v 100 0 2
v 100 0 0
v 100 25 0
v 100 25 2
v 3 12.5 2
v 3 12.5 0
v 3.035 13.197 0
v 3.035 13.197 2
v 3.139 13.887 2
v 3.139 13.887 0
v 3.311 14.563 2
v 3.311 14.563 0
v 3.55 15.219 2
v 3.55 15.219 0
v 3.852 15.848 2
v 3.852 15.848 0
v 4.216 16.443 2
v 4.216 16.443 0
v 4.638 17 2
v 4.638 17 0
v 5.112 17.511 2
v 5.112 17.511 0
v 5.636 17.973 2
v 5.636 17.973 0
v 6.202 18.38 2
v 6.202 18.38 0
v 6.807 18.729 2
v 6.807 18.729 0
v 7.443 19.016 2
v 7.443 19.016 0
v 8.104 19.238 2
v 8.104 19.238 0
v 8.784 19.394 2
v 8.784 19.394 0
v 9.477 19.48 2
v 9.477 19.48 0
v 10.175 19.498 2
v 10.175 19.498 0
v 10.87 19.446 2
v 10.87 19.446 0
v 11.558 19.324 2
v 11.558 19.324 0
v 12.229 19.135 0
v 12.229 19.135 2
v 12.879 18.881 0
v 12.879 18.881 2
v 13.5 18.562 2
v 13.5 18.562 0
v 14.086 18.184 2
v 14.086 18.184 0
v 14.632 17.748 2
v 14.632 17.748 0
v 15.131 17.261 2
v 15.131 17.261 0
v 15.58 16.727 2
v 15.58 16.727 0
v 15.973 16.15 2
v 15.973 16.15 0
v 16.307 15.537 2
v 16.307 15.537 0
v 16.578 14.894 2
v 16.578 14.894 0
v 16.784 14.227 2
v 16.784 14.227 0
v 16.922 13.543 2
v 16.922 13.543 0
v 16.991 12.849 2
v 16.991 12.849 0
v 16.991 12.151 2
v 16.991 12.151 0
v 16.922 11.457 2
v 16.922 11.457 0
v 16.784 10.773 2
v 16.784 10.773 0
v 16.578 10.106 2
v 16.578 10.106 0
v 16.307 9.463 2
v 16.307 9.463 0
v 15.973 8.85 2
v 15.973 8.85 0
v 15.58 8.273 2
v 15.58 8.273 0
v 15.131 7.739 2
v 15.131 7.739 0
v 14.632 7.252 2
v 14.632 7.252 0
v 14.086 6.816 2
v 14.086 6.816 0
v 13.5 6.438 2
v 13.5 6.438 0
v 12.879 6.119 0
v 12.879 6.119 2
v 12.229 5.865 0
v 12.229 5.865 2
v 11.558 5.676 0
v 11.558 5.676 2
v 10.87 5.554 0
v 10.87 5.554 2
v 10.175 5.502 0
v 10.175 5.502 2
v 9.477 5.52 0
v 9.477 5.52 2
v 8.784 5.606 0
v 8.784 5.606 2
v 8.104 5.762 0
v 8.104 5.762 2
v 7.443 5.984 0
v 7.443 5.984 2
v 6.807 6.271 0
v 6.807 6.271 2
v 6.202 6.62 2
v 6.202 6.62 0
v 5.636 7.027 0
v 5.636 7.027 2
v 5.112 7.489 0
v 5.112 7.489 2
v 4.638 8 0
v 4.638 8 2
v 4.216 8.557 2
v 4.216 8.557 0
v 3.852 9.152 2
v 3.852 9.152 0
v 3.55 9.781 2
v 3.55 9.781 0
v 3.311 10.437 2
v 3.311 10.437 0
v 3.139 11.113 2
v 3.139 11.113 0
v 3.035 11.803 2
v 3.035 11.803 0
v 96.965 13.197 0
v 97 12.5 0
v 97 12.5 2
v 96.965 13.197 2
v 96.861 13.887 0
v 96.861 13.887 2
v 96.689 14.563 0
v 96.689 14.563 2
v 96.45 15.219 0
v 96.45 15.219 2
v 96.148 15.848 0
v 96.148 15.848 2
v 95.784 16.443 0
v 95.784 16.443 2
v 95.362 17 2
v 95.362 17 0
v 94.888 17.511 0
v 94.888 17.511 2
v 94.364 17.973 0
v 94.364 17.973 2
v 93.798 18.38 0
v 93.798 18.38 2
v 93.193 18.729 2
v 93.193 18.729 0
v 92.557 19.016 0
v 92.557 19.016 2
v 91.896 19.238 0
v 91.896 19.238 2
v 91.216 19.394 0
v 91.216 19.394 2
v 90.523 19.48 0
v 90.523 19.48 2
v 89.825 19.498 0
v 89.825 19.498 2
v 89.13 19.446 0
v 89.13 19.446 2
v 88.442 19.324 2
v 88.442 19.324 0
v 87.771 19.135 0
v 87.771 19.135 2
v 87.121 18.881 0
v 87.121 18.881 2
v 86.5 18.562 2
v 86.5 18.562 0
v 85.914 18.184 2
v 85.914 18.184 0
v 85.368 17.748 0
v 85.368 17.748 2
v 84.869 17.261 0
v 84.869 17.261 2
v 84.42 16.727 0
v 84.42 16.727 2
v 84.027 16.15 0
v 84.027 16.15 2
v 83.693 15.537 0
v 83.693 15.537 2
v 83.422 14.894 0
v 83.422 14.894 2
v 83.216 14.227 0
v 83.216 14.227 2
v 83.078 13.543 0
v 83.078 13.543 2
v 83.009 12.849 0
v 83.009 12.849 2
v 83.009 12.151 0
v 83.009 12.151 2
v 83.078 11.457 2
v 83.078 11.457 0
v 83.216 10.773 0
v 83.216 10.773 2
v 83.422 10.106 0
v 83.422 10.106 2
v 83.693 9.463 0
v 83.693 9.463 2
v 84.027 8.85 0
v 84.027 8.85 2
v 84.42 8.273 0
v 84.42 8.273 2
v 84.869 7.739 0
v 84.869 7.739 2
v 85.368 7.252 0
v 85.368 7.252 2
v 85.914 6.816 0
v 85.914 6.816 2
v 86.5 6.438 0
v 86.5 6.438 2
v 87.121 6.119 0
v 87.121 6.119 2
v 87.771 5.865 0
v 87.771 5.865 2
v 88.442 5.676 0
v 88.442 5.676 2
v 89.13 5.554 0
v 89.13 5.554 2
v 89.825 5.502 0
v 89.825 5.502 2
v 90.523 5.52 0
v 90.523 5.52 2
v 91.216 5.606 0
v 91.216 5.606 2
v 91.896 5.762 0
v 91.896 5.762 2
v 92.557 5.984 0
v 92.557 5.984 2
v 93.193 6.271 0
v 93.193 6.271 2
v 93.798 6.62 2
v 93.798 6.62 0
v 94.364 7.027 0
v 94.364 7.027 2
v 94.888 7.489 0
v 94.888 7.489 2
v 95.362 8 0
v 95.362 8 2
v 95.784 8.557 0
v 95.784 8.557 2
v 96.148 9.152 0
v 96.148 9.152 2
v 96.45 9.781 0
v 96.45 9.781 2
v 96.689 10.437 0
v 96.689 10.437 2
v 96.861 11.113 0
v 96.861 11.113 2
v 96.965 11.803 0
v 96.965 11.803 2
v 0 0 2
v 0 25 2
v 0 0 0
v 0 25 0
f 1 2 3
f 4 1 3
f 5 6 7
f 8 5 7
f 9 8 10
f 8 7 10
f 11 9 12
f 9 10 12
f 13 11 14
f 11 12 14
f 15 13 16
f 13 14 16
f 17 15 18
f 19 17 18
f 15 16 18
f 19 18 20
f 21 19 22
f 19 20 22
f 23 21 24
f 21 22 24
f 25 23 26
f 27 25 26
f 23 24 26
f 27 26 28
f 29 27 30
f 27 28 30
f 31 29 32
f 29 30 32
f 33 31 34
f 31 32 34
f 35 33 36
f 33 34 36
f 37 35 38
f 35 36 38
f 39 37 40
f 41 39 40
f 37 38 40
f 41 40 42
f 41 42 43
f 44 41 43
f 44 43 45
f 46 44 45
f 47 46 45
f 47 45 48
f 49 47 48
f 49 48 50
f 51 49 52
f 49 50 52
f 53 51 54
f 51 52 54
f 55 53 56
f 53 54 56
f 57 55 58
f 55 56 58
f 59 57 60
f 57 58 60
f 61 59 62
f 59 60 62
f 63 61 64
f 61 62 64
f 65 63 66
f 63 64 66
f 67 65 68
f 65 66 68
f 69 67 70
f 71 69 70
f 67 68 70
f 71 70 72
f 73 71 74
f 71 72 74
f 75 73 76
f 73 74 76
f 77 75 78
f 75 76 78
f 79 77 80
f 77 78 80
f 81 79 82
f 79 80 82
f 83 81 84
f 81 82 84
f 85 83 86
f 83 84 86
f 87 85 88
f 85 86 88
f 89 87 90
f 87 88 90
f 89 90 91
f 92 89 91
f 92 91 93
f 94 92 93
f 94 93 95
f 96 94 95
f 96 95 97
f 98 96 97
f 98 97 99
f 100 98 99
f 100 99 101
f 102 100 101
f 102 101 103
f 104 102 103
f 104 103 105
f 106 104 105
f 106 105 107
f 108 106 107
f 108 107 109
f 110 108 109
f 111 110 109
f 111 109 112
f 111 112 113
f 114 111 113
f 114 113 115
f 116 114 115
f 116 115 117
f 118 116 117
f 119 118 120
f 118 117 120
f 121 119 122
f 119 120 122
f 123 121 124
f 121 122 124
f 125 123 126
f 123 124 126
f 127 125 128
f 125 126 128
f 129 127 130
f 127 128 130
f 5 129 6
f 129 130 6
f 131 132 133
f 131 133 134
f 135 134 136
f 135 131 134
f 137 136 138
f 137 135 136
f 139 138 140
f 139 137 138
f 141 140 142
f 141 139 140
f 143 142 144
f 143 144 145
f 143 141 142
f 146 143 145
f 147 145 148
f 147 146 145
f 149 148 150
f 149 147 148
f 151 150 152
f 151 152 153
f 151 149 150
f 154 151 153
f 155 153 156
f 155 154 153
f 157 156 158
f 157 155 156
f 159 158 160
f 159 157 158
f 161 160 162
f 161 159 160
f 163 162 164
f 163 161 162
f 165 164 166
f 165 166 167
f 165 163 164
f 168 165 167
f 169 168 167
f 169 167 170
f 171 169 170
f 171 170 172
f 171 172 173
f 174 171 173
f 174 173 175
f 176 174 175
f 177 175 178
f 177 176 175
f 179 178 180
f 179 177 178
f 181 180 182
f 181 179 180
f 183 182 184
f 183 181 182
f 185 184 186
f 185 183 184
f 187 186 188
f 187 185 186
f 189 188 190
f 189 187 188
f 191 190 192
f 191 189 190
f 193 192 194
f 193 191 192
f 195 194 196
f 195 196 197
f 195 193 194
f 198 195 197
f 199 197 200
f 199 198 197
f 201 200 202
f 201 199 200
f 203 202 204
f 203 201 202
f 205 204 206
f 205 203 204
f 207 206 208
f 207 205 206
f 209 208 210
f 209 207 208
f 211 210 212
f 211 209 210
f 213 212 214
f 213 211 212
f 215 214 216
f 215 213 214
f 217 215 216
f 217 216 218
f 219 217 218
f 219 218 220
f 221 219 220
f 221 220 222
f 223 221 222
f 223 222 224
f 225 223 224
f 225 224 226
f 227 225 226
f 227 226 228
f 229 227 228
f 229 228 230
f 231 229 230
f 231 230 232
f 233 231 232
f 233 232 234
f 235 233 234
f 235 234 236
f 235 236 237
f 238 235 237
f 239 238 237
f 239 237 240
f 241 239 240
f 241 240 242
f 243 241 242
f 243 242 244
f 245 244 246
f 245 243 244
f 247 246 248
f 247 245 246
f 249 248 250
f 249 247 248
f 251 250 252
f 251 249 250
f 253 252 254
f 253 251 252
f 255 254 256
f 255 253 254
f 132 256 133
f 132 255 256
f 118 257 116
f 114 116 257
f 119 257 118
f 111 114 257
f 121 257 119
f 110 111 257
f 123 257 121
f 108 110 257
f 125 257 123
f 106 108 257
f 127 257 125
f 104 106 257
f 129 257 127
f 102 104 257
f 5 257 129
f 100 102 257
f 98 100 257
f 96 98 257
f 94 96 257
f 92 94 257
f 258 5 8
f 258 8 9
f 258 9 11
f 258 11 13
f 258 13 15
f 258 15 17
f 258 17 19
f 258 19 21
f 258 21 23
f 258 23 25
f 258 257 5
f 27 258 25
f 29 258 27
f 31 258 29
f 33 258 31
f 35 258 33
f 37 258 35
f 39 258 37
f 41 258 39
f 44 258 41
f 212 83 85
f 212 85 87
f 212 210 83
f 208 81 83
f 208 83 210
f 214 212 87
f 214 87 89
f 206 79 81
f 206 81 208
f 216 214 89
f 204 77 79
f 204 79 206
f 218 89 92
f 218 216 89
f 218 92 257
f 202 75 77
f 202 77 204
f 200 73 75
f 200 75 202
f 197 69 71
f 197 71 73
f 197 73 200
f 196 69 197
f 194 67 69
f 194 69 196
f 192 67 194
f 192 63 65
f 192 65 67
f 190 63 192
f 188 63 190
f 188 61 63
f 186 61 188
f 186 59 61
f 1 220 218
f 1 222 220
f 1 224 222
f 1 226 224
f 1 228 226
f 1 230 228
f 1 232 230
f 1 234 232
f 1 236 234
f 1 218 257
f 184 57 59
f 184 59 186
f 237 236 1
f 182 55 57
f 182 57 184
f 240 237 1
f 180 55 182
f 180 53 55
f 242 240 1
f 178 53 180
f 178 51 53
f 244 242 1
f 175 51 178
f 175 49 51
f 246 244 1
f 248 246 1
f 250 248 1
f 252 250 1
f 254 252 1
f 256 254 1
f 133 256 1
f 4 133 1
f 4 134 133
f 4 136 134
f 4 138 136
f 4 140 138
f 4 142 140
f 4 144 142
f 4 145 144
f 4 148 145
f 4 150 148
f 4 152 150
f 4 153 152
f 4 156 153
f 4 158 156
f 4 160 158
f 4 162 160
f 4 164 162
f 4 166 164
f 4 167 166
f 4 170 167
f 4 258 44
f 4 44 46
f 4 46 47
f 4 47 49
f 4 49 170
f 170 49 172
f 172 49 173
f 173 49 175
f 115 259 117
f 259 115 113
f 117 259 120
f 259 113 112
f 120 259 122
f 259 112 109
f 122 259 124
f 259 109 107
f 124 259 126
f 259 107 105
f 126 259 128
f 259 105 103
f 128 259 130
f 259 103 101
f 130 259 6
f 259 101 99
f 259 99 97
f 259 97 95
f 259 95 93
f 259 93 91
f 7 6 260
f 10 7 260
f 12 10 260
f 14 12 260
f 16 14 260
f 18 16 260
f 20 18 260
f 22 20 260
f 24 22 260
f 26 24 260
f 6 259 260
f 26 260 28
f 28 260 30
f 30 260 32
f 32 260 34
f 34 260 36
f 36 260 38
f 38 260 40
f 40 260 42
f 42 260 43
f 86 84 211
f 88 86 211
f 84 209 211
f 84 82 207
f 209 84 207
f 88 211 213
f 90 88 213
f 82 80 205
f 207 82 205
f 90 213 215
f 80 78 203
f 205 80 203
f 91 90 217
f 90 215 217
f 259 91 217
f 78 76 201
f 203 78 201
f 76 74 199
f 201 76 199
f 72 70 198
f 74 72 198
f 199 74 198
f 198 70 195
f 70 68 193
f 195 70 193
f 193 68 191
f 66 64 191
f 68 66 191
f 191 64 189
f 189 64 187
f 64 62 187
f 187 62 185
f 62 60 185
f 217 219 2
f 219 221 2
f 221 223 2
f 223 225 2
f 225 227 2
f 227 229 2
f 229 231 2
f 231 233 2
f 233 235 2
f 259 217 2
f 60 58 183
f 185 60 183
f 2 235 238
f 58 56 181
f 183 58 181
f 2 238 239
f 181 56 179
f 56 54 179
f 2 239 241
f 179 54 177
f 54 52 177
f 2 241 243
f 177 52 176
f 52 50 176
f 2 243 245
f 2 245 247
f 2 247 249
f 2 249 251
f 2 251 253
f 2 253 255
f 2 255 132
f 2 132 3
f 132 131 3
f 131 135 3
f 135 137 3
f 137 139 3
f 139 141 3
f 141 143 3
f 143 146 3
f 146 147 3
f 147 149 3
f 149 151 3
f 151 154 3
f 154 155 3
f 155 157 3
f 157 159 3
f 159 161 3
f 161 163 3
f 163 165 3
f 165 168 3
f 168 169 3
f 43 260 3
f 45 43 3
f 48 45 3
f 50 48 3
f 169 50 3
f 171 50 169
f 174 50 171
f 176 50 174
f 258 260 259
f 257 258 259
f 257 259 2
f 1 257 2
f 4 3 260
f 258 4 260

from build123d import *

# Parameters (mm, degrees)
F0_R     = 7
F1_DEPTH = 2


with BuildPart() as f1:
    # F0 (on Top) → F1 (new body)
    with BuildSketch(Plane.XY):
        with Locations((90, 12.5)):
            Circle(F0_R)
        with BuildLine():
            ThreePointArc((17, 12.5), (10, 19.5), (3, 12.5))
            ThreePointArc((3, 12.5), (10, 5.5), (17, 12.5))
        make_face()
        Polygon((0, 12.5), (0, 0), (100, 0), (100, 12.5), (100, 25), (0, 25), align=None)
        with BuildLine():
            ThreePointArc((17, 12.5), (10, 5.5), (3, 12.5))
            ThreePointArc((3, 12.5), (10, 19.5), (17, 12.5))
        make_face(mode=Mode.SUBTRACT)
        with Locations((90, 12.5)):
            Circle(F0_R, mode=Mode.SUBTRACT)
    extrude(amount=F1_DEPTH)


solid = f1.part
